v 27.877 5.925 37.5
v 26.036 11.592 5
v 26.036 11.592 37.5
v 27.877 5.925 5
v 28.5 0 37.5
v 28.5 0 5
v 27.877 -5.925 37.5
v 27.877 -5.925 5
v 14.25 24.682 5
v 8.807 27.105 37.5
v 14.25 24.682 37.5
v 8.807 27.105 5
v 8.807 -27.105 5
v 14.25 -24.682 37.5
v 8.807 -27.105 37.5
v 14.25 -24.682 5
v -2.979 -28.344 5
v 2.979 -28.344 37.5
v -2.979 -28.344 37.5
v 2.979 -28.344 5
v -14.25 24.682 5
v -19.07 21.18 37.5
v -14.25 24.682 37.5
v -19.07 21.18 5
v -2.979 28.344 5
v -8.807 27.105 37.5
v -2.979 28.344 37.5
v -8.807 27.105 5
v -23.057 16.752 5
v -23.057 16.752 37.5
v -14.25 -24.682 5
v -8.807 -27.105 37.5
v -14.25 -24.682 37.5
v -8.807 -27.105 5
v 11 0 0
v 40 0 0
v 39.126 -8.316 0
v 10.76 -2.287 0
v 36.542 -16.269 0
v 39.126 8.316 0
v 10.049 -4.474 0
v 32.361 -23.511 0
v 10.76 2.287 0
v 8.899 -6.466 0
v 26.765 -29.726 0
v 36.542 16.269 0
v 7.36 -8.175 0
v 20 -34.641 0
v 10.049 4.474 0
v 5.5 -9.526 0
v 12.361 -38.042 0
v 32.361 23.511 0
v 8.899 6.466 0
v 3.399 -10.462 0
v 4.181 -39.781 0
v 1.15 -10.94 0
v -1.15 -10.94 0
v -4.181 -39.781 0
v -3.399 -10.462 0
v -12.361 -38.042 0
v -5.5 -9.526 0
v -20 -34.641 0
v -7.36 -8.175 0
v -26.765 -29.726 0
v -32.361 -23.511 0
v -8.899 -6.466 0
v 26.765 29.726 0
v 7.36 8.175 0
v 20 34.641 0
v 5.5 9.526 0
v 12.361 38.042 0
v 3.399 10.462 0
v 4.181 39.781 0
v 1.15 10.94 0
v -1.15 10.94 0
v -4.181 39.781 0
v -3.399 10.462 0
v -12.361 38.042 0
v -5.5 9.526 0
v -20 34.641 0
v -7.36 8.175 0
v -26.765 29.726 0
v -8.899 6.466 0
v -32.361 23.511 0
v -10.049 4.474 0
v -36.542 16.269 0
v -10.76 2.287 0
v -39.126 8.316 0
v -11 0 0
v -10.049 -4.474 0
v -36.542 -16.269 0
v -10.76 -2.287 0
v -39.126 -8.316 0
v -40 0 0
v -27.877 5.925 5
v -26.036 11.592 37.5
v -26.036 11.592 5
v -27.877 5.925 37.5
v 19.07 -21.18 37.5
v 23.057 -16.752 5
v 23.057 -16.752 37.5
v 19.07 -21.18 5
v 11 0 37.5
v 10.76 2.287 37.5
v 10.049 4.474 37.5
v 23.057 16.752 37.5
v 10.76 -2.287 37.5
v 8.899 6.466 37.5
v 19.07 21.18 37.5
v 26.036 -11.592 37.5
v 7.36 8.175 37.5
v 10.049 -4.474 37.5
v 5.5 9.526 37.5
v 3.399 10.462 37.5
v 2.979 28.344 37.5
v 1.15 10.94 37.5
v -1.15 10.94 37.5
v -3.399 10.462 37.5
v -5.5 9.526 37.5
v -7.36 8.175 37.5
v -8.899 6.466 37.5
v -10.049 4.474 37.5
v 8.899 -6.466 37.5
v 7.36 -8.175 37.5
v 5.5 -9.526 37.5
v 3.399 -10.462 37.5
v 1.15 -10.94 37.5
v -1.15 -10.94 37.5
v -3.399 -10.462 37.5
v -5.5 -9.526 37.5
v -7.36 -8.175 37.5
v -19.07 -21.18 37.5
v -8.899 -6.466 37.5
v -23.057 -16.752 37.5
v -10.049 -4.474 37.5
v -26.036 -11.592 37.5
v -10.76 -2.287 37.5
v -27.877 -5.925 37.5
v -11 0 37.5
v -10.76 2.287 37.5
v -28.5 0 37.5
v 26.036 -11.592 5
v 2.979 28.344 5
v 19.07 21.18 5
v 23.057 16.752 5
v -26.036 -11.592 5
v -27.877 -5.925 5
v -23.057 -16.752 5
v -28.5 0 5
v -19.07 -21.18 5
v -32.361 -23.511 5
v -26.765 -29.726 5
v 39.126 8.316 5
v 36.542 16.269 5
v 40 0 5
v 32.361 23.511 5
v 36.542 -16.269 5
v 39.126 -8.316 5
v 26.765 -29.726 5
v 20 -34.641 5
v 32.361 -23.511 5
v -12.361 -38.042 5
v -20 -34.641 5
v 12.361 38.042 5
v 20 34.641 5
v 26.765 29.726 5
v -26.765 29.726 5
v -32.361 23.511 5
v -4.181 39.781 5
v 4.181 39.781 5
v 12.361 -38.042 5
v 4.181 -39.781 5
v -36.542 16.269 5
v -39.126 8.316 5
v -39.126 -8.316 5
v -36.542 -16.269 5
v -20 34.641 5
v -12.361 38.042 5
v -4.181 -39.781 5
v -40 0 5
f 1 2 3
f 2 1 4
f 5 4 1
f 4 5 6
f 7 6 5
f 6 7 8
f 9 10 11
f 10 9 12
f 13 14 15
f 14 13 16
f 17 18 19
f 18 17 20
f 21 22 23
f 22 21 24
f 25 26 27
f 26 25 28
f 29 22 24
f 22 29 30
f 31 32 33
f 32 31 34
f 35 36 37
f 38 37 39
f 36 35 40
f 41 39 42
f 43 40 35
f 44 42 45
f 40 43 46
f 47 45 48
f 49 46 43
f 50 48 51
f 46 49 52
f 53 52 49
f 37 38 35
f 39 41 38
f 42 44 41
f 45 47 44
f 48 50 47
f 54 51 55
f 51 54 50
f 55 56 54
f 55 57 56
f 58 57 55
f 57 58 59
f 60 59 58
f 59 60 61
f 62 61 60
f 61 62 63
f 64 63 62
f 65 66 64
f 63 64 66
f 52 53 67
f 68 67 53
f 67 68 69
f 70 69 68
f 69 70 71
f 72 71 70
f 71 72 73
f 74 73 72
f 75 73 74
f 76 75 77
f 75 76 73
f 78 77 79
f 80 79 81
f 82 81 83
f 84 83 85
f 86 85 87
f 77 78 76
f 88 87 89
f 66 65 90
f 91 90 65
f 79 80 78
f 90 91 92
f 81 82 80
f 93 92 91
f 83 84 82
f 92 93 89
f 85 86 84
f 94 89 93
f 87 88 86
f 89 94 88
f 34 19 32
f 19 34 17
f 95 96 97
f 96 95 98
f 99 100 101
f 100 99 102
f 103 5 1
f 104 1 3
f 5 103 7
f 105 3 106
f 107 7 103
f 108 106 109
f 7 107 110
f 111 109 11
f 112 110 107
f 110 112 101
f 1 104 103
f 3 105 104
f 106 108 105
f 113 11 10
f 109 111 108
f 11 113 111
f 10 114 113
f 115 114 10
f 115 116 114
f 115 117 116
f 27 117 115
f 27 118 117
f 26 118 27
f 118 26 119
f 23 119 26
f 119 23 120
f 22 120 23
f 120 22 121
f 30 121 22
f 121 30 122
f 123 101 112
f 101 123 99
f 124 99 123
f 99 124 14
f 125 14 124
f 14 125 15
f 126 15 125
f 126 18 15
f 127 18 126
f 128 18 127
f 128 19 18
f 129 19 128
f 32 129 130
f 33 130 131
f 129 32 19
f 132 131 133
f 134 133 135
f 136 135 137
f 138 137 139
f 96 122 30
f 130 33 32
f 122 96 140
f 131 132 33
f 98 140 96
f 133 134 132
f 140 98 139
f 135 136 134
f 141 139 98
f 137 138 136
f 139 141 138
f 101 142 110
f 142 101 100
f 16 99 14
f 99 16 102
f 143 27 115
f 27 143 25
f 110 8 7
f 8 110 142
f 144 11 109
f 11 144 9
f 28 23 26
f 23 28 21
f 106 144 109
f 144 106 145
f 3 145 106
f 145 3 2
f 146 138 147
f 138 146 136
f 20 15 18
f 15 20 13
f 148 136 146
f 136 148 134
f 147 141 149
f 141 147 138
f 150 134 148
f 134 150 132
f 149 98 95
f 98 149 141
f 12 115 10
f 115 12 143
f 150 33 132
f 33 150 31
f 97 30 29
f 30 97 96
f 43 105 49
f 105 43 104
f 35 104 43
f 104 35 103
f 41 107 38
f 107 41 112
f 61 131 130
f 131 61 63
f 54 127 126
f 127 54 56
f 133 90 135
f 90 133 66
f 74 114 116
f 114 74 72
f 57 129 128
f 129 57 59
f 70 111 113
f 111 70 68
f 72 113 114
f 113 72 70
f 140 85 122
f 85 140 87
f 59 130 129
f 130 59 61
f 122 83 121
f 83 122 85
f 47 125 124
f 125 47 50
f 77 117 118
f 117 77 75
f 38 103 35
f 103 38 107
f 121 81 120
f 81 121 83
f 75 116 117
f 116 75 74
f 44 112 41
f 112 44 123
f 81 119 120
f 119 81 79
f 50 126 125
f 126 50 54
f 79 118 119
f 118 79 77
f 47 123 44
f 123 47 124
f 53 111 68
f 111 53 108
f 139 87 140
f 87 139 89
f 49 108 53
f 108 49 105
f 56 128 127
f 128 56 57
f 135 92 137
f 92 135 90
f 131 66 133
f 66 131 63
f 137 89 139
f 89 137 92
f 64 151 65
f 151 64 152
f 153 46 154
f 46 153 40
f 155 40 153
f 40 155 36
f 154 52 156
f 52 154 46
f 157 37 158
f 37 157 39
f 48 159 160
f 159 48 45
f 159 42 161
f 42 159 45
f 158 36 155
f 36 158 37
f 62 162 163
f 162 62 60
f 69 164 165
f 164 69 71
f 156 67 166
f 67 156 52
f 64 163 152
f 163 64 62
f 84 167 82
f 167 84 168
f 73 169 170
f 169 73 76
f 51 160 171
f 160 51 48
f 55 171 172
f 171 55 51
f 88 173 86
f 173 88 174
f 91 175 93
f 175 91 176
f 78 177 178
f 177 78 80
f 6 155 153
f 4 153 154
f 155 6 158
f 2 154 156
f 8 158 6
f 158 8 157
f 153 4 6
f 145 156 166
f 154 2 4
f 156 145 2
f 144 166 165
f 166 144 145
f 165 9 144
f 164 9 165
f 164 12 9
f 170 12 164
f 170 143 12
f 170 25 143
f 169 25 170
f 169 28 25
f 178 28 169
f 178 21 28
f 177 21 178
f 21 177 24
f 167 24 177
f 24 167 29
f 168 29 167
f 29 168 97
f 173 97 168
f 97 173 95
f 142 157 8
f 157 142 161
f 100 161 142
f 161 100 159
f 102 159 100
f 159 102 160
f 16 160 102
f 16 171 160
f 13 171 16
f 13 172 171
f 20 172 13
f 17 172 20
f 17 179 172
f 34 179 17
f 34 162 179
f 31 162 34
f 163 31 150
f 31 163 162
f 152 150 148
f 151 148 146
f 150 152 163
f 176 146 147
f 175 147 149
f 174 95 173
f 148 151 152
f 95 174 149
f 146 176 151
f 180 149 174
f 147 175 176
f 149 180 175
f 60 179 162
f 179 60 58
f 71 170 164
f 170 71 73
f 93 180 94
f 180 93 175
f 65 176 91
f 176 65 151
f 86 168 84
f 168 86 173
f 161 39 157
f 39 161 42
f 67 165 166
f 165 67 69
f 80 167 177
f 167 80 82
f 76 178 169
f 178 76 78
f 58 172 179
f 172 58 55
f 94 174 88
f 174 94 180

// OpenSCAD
// ctc_spool_bush.scad

echo(version=version());

spool_dia = 58;

	hollow_cyl(spool_dia-1, 22, 37.5);
	hollow_cyl(80, 22, 5);


module hollow_cyl(od, id, len) {
	difference(){
		cylinder(h = len, r=od/2, center = false);
 		cylinder(h = len, r=id/2, center = false);
	}
}
